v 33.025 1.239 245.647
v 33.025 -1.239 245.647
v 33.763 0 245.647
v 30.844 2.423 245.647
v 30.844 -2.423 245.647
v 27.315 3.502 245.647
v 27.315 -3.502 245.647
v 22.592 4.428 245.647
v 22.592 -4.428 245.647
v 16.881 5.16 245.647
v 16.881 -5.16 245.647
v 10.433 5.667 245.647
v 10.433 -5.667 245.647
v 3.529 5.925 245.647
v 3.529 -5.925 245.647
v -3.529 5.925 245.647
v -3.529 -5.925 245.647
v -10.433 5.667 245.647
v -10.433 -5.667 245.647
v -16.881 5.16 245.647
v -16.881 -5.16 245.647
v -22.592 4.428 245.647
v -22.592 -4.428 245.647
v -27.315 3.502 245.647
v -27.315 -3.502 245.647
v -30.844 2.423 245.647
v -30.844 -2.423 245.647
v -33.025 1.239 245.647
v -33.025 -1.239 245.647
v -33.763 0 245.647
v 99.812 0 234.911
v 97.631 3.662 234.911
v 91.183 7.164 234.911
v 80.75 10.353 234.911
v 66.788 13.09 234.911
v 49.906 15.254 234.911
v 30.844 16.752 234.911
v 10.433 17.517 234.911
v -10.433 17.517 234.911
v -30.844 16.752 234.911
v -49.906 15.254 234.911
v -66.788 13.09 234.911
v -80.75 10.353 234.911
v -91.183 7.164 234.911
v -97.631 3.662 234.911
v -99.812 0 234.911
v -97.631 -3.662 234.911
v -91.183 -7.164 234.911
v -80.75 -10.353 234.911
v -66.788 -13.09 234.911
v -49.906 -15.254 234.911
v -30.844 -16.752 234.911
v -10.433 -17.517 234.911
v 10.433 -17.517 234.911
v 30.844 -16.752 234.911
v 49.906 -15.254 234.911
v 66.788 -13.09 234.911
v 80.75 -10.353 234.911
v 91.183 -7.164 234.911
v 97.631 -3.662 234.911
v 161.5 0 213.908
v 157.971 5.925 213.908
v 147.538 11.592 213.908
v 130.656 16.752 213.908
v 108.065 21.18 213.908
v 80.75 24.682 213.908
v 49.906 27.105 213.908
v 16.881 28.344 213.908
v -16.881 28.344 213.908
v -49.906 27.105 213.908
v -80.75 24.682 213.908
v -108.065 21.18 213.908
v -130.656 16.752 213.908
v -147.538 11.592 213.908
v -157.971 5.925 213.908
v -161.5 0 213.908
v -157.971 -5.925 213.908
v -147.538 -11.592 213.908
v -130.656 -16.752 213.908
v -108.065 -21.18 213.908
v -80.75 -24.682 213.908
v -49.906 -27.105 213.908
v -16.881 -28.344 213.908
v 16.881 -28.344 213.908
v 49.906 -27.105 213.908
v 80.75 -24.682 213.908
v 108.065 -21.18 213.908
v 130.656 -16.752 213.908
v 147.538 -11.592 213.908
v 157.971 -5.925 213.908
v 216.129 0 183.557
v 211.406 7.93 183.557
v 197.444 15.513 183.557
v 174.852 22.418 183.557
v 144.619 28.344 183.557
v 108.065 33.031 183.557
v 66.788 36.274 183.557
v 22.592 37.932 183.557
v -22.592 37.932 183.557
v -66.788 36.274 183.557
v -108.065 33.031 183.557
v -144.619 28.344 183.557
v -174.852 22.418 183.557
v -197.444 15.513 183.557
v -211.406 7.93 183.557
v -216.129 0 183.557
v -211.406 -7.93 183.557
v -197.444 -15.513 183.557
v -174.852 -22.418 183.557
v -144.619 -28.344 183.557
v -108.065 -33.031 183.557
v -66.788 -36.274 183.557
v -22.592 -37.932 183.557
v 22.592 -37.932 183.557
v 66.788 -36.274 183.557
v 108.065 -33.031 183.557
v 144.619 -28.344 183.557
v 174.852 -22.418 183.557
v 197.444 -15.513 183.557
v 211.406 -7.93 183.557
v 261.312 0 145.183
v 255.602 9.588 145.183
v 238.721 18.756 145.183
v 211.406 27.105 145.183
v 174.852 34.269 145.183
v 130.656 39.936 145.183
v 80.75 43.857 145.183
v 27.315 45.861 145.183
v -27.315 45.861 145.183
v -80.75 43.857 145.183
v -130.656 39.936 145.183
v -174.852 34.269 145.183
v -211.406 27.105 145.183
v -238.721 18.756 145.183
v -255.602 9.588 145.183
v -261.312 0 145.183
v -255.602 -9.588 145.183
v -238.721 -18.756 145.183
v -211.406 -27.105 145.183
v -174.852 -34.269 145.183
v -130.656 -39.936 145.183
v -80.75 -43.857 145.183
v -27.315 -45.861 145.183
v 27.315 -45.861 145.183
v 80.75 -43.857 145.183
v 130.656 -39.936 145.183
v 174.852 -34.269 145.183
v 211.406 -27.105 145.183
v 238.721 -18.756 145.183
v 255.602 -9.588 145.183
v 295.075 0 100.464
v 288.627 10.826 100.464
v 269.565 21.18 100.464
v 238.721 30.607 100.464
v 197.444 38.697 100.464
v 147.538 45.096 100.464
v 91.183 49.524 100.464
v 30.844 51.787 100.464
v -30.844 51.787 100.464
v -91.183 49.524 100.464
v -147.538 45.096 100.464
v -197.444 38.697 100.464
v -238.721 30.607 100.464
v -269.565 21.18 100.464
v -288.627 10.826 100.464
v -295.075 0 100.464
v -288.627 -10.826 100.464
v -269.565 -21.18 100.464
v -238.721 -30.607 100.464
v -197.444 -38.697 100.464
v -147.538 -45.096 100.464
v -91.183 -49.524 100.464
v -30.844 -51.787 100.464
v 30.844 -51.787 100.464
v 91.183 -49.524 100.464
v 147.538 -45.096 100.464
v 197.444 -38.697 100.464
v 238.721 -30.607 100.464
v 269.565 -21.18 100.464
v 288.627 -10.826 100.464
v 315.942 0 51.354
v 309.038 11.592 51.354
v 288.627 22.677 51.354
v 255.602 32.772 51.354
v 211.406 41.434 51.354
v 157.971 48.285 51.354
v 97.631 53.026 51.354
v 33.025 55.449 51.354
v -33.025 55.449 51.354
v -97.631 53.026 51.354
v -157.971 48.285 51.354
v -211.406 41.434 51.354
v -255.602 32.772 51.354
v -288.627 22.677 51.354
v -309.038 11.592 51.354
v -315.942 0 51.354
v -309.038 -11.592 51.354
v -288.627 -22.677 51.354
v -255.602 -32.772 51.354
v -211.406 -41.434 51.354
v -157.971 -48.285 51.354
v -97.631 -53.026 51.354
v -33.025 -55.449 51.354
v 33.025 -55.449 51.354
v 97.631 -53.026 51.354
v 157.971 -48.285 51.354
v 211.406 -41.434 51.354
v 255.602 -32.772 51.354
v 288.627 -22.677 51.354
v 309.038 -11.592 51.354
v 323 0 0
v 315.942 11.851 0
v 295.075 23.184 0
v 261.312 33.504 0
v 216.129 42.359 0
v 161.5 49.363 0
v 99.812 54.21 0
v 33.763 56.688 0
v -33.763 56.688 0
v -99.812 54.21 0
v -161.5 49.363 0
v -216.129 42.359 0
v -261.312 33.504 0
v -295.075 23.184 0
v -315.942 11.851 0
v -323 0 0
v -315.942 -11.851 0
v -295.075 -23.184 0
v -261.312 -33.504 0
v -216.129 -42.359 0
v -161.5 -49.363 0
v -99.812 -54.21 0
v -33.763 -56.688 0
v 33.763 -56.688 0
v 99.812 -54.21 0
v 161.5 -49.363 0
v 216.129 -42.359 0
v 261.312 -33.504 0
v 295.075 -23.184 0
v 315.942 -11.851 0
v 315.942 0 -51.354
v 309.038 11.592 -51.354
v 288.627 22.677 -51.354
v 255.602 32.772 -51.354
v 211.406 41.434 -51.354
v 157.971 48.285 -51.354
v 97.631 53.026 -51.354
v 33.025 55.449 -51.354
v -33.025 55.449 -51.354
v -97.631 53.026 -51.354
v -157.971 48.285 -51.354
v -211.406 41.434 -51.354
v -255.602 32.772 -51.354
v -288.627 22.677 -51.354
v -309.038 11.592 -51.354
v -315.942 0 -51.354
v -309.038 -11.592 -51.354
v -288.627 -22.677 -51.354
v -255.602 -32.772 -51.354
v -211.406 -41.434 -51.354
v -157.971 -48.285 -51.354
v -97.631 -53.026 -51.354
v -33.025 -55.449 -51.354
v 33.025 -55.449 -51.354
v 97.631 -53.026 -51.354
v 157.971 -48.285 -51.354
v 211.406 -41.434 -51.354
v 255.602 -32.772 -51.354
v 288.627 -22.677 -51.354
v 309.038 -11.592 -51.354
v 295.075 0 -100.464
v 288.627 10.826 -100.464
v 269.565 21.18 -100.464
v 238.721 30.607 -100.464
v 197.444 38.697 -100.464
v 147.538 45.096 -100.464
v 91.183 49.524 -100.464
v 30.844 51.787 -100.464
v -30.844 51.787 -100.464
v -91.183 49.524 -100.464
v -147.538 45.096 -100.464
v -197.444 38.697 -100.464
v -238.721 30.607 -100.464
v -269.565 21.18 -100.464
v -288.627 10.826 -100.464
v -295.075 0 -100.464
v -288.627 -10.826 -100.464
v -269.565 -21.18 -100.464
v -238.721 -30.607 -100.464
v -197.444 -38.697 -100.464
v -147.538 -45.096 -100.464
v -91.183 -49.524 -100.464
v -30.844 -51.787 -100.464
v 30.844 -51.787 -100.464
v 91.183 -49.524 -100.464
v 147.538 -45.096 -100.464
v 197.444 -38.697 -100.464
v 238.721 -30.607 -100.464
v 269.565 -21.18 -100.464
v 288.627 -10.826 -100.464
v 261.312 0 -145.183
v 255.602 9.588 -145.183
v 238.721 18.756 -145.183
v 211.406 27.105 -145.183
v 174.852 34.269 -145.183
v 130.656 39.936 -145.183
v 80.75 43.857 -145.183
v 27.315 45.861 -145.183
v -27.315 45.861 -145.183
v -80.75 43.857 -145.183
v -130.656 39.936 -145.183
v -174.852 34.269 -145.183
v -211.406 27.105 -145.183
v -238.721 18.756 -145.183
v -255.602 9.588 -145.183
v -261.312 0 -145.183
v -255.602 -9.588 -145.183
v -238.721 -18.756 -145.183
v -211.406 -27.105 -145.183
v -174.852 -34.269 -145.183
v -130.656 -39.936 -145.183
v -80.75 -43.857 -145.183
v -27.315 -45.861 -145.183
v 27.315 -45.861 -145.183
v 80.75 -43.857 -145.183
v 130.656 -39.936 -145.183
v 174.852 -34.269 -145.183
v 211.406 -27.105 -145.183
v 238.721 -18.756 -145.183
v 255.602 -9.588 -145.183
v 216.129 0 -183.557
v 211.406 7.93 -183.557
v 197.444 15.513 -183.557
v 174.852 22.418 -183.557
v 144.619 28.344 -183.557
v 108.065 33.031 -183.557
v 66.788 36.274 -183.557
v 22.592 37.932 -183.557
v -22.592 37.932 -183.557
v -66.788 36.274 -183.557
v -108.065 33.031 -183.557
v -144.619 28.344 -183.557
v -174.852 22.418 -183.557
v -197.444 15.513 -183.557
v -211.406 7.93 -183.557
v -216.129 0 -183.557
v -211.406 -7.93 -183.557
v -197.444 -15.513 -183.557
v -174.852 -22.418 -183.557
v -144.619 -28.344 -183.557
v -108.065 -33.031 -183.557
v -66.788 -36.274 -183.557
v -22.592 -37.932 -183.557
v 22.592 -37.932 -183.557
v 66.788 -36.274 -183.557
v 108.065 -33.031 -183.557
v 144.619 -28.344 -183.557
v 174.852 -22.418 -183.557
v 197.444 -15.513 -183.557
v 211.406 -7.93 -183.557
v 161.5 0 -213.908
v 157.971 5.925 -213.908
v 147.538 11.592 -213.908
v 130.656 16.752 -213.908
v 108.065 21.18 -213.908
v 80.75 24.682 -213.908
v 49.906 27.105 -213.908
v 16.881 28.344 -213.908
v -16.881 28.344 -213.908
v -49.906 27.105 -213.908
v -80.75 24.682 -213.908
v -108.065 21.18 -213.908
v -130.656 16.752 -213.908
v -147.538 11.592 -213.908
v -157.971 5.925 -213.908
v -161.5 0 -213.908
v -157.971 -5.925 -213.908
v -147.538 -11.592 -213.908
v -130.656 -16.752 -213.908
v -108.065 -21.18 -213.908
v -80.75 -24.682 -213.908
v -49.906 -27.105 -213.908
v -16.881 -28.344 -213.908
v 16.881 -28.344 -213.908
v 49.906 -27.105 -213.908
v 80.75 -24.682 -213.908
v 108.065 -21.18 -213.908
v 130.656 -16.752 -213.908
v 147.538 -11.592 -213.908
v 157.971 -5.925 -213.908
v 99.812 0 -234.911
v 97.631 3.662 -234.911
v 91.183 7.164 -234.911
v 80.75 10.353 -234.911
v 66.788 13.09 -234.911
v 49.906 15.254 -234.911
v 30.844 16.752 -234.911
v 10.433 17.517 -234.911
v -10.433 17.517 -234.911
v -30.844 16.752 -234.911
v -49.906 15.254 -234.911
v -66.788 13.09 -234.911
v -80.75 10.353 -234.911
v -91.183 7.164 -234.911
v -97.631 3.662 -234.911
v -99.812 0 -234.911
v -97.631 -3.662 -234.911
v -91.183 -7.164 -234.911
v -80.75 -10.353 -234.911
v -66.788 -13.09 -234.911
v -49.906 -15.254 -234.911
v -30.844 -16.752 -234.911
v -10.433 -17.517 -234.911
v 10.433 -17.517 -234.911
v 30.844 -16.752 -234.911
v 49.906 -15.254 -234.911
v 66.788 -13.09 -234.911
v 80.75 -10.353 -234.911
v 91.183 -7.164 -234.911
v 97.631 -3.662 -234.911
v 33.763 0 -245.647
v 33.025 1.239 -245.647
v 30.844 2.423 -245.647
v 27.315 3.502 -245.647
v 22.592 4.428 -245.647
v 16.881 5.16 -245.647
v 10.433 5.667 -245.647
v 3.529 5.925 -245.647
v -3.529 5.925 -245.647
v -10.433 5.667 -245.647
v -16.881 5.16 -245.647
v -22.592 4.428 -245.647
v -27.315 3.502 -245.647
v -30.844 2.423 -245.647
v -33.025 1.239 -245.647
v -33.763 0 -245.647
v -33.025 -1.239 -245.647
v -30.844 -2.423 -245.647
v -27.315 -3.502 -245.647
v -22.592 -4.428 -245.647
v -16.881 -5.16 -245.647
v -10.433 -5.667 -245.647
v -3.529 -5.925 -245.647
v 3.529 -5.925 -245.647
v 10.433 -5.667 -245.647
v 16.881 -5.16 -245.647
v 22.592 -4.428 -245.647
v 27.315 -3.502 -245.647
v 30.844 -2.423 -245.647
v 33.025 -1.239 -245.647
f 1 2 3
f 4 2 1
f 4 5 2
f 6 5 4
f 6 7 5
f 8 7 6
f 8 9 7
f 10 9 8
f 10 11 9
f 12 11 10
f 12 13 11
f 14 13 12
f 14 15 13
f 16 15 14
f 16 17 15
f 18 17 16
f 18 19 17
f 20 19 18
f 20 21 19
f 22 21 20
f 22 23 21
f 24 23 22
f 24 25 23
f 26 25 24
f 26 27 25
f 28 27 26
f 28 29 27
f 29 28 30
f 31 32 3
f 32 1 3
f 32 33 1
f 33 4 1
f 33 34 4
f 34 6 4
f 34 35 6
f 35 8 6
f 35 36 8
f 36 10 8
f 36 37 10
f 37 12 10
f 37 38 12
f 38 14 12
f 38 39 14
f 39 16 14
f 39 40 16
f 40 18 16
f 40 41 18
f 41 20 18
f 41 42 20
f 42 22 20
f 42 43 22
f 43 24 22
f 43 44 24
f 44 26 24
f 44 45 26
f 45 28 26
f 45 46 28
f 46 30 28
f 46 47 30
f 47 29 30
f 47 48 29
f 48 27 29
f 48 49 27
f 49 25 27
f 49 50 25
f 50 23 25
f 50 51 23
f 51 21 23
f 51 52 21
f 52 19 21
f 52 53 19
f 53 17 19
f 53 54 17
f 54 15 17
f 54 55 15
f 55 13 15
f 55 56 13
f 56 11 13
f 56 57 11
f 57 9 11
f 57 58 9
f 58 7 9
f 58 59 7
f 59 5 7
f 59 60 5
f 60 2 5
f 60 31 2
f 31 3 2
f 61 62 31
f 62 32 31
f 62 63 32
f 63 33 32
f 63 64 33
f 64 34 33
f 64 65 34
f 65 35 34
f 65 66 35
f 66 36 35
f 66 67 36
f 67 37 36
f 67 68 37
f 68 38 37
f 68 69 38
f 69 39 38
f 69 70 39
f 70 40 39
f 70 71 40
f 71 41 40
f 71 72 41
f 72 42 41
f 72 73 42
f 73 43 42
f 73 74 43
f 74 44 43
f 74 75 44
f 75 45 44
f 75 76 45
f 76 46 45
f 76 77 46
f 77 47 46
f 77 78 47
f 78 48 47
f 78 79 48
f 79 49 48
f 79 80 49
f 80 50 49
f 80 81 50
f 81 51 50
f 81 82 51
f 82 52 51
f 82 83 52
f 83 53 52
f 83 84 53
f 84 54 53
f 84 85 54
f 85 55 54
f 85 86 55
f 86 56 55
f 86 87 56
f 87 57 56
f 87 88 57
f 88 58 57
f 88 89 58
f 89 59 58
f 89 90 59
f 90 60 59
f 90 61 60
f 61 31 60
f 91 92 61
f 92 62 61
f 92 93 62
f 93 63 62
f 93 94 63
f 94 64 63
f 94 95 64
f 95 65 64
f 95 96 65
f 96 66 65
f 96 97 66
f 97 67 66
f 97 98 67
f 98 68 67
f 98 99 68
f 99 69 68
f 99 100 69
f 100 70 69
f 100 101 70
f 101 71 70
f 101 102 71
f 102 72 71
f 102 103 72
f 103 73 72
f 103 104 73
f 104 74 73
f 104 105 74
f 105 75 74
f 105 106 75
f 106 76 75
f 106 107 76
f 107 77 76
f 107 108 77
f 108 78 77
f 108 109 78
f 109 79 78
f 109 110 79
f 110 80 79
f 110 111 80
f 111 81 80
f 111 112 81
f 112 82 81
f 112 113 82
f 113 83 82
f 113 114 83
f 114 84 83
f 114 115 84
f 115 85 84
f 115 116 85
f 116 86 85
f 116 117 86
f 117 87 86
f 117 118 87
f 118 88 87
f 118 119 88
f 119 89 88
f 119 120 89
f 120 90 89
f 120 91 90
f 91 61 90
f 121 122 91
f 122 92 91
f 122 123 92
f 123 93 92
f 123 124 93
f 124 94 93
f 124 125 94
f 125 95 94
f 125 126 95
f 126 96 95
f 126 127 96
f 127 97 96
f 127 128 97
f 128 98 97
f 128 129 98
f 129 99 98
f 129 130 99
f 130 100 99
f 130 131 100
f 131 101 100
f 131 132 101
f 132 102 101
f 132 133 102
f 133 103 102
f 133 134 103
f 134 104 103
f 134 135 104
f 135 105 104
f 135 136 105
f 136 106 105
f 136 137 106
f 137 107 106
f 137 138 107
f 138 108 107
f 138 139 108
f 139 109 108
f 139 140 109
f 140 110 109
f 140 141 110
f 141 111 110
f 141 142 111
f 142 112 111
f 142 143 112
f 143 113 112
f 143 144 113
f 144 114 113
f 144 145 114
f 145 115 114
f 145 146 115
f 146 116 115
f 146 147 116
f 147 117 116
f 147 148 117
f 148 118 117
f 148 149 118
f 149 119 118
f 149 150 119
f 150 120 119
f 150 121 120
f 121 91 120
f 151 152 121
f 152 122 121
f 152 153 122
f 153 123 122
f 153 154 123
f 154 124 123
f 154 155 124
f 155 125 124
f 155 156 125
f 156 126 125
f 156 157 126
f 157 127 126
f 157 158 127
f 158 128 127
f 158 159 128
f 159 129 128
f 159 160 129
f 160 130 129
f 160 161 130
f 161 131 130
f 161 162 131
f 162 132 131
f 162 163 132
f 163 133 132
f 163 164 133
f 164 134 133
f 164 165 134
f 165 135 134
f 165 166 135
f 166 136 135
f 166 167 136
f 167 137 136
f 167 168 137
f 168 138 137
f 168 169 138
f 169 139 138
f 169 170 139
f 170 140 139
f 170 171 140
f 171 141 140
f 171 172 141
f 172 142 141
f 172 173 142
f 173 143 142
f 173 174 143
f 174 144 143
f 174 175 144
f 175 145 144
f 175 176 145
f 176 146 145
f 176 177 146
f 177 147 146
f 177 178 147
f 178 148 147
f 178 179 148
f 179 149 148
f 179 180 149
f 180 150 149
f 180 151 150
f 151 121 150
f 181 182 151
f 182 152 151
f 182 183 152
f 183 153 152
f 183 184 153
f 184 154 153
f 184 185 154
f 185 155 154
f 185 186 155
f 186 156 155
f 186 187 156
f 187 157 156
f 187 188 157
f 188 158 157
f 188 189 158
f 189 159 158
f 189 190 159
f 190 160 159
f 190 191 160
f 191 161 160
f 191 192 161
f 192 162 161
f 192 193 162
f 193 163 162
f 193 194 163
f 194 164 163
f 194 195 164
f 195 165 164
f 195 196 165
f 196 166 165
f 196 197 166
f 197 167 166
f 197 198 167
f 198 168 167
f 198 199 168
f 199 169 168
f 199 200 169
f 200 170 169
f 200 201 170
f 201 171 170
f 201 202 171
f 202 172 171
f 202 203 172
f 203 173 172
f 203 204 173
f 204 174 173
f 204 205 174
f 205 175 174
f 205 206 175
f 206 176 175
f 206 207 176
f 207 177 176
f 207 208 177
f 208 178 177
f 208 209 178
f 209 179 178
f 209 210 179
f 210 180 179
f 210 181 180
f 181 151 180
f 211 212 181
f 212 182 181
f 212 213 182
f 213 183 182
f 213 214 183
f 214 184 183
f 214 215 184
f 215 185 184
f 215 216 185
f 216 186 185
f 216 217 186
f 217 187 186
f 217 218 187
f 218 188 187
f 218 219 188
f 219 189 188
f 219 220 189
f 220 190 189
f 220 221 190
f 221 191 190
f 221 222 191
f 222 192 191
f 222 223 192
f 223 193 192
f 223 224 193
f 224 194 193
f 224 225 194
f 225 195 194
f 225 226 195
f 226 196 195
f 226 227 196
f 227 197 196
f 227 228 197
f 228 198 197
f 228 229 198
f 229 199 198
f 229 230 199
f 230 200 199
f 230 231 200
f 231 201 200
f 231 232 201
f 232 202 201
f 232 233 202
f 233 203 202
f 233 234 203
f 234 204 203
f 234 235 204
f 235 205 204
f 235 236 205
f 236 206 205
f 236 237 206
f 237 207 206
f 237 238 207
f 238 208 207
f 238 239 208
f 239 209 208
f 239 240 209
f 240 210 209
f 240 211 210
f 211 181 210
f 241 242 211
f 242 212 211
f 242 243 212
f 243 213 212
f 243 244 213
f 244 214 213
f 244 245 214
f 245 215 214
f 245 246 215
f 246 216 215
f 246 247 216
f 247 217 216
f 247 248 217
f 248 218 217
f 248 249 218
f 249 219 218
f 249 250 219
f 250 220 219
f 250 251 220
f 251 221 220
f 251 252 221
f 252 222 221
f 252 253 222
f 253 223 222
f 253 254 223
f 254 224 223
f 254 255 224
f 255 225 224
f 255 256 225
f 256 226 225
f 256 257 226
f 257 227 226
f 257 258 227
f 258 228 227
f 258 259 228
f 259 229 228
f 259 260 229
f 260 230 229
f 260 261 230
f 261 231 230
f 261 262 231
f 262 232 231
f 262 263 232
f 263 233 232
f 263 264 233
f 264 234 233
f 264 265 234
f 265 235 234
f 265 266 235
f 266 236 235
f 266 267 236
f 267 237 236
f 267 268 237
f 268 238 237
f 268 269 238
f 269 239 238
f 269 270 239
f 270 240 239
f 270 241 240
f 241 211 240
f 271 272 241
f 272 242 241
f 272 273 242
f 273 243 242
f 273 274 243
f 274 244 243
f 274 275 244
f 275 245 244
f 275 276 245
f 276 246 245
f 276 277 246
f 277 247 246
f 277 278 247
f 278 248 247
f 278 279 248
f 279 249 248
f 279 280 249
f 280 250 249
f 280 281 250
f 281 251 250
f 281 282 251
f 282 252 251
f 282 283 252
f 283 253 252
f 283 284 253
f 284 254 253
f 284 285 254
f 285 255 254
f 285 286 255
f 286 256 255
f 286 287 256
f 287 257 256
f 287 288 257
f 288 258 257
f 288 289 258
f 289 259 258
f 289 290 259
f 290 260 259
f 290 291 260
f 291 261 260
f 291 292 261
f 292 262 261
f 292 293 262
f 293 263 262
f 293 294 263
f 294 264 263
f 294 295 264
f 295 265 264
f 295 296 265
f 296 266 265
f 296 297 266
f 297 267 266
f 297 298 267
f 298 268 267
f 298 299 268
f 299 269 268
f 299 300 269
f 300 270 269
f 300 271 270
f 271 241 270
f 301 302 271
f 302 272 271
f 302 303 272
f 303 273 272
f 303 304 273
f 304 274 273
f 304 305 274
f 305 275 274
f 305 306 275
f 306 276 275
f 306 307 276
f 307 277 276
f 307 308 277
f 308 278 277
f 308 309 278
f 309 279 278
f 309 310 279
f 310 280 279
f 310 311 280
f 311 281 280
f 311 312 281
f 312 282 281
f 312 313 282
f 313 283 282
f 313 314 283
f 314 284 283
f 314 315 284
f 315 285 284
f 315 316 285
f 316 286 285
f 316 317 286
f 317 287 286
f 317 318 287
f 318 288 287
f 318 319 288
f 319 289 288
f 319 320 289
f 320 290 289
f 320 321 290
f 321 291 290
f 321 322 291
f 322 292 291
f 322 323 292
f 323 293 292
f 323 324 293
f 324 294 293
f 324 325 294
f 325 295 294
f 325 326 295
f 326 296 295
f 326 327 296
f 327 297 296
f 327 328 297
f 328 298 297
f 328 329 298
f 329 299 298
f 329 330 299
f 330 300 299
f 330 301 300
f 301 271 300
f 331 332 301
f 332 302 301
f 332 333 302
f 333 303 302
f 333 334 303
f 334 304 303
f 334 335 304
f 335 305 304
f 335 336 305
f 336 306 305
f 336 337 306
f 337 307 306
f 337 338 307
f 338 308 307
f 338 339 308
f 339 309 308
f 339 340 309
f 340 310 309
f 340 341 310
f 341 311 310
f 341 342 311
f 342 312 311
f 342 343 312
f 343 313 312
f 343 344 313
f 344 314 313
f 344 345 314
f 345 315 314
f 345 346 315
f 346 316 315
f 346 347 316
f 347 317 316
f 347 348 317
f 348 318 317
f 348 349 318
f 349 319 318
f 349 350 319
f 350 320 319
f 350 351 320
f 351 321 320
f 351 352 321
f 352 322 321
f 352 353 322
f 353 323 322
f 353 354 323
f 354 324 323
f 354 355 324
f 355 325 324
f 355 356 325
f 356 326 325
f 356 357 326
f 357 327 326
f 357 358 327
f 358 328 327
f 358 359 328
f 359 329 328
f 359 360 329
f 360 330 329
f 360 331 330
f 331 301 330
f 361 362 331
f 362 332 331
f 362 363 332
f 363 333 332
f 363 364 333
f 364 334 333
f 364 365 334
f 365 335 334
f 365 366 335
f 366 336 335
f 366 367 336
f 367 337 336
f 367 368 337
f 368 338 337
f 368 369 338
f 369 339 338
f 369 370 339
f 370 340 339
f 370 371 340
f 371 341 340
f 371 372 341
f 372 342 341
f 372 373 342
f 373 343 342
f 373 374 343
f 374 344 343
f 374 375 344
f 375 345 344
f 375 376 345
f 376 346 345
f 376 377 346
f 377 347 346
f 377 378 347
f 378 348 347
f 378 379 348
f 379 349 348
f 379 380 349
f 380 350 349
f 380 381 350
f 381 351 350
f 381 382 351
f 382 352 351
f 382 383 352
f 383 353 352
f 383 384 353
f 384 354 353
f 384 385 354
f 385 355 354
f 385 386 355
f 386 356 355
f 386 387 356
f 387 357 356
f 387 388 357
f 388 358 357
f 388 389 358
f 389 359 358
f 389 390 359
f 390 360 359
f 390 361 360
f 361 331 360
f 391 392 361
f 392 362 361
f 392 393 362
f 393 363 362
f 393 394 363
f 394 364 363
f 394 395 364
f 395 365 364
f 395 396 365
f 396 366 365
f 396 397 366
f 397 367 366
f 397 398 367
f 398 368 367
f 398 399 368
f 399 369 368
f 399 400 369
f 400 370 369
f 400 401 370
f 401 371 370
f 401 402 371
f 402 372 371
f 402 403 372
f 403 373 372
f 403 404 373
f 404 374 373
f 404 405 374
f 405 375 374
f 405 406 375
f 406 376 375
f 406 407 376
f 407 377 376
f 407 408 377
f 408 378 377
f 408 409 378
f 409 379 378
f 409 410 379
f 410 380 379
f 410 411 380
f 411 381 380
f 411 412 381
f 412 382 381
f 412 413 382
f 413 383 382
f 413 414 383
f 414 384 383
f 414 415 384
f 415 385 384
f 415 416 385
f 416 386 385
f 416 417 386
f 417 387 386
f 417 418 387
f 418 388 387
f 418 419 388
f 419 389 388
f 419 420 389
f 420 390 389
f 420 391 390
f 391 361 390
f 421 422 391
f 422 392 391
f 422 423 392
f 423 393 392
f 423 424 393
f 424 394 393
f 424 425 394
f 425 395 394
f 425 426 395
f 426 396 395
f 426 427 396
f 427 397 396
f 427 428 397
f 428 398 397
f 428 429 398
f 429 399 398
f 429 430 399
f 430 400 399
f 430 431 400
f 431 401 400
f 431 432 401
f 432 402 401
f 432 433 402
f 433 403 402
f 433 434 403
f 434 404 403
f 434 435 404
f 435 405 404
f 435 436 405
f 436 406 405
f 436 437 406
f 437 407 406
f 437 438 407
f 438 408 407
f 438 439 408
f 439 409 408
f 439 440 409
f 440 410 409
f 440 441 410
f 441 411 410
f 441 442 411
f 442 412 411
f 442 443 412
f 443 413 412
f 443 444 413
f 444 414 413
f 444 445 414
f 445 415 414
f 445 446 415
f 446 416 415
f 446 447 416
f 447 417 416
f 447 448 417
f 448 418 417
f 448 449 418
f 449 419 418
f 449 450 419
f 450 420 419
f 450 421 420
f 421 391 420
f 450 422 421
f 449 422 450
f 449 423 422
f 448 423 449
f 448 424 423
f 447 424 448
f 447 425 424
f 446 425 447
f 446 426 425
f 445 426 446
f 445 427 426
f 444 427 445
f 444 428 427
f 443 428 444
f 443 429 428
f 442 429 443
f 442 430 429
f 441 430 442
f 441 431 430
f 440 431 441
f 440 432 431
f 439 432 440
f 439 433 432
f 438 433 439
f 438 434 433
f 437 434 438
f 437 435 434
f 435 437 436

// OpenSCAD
// Generated by SolidPython 1.0.1 on 2020-07-29 00:46:52


scale(v = [17, 3, 13]) {
	sphere(r = 19);
}
/***********************************************
*********      SolidPython code:      **********
************************************************
 
# import packages: SolidPython
from solid import *
from solid.utils import *
from itertools import chain, combinations, permutations


class Resize:

    def __init__(self, scad_file):
        self.scad_file = scad_file
        #self.scad_file = import_scad(scad_file)
        # cone/cylinder param:
        self.r1 = 0
        self.r2 = 0
        self.h = 0
        # rectangular prism param:
        self.w = 0
        self.l = 0
        # ellipse param:
        self.r = 0

    # import OpenScad code (file name corresponds to shape)


    # classify shape + parameters
    def assign(self, param1, param2, param3):
        if self.scad_file == 'cone.scad':
            self.r1 = param1
            self.r2 = param2
            self.h = param3
        elif self.scad_file == 'cylinder.scad':
            self.r1 = param1
            self.r2 = param2
            self.h = param3
        elif self.scad_file == 'rectangularPrism.scad':
            self.h = param1
            self.l = param2
            self.w = param3
        else:
            self.r = param1
            self.h = param2

    # resize parameters
    def iterate(self):
        x = range(3, 20, 2)
        i = 1
        if self.scad_file == 'cone.scad':
            tempList = list(permutations(x, 2))
            for temp in tempList:
                param1 = temp[0]
                param2 = temp[1]
                filepath = 'produced_scad_files/' + 'cone' + str(param1) + '_' + str(param2) + '_' + '.scad'
                scad_render_to_file(cylinder(h=param1, r1=param2, r2=0), filepath)

        elif self.scad_file == 'cylinder.scad':
            tempList = list(permutations(x, 3))
            for temp in tempList:
                param1 = temp[0]
                param2 = temp[1]
                filepath = 'produced_scad_files/' + 'cylinder' + str(param1) + '_' + str(param2) + '_' + '.scad'
                scad_render_to_file(cylinder(h=param1, r1=param2, r2=param2), filepath)

        elif self.scad_file == 'rectangularPrism.scad':
            tempList = list(permutations(x, 3))
            for temp in tempList:
                param1 = temp[0]
                param2 = temp[1]
                param3 = temp[2]
                filepath = 'produced_scad_files/' + 'rectangularPrism' + str(param1) + '_' + str(param2) + '_' + str(
                    param3) + '.scad'
                scad_render_to_file(cube(size=(param1, param2, param3)), filepath)

        elif self.scad_file == 'ellipse.scad':
            tempList = list(permutations(x, 4))
            for temp in tempList:
                param1 = temp[0]
                param2 = temp[1]
                param3 = temp[2]
                param4 = temp[3]
                filepath = 'produced_scad_files/' + 'ellipse' + str(param1) + '_' + str(param2) + '_' + str(param3) + '_' + str(param4) + '.scad'
                scad_render_to_file(scale([param1, param2, param3])(sphere(r=param4)), filepath)

    def render_to_scadfile(self):
        scad_render_to_file(scad, 'example.scad') 
 
************************************************/
